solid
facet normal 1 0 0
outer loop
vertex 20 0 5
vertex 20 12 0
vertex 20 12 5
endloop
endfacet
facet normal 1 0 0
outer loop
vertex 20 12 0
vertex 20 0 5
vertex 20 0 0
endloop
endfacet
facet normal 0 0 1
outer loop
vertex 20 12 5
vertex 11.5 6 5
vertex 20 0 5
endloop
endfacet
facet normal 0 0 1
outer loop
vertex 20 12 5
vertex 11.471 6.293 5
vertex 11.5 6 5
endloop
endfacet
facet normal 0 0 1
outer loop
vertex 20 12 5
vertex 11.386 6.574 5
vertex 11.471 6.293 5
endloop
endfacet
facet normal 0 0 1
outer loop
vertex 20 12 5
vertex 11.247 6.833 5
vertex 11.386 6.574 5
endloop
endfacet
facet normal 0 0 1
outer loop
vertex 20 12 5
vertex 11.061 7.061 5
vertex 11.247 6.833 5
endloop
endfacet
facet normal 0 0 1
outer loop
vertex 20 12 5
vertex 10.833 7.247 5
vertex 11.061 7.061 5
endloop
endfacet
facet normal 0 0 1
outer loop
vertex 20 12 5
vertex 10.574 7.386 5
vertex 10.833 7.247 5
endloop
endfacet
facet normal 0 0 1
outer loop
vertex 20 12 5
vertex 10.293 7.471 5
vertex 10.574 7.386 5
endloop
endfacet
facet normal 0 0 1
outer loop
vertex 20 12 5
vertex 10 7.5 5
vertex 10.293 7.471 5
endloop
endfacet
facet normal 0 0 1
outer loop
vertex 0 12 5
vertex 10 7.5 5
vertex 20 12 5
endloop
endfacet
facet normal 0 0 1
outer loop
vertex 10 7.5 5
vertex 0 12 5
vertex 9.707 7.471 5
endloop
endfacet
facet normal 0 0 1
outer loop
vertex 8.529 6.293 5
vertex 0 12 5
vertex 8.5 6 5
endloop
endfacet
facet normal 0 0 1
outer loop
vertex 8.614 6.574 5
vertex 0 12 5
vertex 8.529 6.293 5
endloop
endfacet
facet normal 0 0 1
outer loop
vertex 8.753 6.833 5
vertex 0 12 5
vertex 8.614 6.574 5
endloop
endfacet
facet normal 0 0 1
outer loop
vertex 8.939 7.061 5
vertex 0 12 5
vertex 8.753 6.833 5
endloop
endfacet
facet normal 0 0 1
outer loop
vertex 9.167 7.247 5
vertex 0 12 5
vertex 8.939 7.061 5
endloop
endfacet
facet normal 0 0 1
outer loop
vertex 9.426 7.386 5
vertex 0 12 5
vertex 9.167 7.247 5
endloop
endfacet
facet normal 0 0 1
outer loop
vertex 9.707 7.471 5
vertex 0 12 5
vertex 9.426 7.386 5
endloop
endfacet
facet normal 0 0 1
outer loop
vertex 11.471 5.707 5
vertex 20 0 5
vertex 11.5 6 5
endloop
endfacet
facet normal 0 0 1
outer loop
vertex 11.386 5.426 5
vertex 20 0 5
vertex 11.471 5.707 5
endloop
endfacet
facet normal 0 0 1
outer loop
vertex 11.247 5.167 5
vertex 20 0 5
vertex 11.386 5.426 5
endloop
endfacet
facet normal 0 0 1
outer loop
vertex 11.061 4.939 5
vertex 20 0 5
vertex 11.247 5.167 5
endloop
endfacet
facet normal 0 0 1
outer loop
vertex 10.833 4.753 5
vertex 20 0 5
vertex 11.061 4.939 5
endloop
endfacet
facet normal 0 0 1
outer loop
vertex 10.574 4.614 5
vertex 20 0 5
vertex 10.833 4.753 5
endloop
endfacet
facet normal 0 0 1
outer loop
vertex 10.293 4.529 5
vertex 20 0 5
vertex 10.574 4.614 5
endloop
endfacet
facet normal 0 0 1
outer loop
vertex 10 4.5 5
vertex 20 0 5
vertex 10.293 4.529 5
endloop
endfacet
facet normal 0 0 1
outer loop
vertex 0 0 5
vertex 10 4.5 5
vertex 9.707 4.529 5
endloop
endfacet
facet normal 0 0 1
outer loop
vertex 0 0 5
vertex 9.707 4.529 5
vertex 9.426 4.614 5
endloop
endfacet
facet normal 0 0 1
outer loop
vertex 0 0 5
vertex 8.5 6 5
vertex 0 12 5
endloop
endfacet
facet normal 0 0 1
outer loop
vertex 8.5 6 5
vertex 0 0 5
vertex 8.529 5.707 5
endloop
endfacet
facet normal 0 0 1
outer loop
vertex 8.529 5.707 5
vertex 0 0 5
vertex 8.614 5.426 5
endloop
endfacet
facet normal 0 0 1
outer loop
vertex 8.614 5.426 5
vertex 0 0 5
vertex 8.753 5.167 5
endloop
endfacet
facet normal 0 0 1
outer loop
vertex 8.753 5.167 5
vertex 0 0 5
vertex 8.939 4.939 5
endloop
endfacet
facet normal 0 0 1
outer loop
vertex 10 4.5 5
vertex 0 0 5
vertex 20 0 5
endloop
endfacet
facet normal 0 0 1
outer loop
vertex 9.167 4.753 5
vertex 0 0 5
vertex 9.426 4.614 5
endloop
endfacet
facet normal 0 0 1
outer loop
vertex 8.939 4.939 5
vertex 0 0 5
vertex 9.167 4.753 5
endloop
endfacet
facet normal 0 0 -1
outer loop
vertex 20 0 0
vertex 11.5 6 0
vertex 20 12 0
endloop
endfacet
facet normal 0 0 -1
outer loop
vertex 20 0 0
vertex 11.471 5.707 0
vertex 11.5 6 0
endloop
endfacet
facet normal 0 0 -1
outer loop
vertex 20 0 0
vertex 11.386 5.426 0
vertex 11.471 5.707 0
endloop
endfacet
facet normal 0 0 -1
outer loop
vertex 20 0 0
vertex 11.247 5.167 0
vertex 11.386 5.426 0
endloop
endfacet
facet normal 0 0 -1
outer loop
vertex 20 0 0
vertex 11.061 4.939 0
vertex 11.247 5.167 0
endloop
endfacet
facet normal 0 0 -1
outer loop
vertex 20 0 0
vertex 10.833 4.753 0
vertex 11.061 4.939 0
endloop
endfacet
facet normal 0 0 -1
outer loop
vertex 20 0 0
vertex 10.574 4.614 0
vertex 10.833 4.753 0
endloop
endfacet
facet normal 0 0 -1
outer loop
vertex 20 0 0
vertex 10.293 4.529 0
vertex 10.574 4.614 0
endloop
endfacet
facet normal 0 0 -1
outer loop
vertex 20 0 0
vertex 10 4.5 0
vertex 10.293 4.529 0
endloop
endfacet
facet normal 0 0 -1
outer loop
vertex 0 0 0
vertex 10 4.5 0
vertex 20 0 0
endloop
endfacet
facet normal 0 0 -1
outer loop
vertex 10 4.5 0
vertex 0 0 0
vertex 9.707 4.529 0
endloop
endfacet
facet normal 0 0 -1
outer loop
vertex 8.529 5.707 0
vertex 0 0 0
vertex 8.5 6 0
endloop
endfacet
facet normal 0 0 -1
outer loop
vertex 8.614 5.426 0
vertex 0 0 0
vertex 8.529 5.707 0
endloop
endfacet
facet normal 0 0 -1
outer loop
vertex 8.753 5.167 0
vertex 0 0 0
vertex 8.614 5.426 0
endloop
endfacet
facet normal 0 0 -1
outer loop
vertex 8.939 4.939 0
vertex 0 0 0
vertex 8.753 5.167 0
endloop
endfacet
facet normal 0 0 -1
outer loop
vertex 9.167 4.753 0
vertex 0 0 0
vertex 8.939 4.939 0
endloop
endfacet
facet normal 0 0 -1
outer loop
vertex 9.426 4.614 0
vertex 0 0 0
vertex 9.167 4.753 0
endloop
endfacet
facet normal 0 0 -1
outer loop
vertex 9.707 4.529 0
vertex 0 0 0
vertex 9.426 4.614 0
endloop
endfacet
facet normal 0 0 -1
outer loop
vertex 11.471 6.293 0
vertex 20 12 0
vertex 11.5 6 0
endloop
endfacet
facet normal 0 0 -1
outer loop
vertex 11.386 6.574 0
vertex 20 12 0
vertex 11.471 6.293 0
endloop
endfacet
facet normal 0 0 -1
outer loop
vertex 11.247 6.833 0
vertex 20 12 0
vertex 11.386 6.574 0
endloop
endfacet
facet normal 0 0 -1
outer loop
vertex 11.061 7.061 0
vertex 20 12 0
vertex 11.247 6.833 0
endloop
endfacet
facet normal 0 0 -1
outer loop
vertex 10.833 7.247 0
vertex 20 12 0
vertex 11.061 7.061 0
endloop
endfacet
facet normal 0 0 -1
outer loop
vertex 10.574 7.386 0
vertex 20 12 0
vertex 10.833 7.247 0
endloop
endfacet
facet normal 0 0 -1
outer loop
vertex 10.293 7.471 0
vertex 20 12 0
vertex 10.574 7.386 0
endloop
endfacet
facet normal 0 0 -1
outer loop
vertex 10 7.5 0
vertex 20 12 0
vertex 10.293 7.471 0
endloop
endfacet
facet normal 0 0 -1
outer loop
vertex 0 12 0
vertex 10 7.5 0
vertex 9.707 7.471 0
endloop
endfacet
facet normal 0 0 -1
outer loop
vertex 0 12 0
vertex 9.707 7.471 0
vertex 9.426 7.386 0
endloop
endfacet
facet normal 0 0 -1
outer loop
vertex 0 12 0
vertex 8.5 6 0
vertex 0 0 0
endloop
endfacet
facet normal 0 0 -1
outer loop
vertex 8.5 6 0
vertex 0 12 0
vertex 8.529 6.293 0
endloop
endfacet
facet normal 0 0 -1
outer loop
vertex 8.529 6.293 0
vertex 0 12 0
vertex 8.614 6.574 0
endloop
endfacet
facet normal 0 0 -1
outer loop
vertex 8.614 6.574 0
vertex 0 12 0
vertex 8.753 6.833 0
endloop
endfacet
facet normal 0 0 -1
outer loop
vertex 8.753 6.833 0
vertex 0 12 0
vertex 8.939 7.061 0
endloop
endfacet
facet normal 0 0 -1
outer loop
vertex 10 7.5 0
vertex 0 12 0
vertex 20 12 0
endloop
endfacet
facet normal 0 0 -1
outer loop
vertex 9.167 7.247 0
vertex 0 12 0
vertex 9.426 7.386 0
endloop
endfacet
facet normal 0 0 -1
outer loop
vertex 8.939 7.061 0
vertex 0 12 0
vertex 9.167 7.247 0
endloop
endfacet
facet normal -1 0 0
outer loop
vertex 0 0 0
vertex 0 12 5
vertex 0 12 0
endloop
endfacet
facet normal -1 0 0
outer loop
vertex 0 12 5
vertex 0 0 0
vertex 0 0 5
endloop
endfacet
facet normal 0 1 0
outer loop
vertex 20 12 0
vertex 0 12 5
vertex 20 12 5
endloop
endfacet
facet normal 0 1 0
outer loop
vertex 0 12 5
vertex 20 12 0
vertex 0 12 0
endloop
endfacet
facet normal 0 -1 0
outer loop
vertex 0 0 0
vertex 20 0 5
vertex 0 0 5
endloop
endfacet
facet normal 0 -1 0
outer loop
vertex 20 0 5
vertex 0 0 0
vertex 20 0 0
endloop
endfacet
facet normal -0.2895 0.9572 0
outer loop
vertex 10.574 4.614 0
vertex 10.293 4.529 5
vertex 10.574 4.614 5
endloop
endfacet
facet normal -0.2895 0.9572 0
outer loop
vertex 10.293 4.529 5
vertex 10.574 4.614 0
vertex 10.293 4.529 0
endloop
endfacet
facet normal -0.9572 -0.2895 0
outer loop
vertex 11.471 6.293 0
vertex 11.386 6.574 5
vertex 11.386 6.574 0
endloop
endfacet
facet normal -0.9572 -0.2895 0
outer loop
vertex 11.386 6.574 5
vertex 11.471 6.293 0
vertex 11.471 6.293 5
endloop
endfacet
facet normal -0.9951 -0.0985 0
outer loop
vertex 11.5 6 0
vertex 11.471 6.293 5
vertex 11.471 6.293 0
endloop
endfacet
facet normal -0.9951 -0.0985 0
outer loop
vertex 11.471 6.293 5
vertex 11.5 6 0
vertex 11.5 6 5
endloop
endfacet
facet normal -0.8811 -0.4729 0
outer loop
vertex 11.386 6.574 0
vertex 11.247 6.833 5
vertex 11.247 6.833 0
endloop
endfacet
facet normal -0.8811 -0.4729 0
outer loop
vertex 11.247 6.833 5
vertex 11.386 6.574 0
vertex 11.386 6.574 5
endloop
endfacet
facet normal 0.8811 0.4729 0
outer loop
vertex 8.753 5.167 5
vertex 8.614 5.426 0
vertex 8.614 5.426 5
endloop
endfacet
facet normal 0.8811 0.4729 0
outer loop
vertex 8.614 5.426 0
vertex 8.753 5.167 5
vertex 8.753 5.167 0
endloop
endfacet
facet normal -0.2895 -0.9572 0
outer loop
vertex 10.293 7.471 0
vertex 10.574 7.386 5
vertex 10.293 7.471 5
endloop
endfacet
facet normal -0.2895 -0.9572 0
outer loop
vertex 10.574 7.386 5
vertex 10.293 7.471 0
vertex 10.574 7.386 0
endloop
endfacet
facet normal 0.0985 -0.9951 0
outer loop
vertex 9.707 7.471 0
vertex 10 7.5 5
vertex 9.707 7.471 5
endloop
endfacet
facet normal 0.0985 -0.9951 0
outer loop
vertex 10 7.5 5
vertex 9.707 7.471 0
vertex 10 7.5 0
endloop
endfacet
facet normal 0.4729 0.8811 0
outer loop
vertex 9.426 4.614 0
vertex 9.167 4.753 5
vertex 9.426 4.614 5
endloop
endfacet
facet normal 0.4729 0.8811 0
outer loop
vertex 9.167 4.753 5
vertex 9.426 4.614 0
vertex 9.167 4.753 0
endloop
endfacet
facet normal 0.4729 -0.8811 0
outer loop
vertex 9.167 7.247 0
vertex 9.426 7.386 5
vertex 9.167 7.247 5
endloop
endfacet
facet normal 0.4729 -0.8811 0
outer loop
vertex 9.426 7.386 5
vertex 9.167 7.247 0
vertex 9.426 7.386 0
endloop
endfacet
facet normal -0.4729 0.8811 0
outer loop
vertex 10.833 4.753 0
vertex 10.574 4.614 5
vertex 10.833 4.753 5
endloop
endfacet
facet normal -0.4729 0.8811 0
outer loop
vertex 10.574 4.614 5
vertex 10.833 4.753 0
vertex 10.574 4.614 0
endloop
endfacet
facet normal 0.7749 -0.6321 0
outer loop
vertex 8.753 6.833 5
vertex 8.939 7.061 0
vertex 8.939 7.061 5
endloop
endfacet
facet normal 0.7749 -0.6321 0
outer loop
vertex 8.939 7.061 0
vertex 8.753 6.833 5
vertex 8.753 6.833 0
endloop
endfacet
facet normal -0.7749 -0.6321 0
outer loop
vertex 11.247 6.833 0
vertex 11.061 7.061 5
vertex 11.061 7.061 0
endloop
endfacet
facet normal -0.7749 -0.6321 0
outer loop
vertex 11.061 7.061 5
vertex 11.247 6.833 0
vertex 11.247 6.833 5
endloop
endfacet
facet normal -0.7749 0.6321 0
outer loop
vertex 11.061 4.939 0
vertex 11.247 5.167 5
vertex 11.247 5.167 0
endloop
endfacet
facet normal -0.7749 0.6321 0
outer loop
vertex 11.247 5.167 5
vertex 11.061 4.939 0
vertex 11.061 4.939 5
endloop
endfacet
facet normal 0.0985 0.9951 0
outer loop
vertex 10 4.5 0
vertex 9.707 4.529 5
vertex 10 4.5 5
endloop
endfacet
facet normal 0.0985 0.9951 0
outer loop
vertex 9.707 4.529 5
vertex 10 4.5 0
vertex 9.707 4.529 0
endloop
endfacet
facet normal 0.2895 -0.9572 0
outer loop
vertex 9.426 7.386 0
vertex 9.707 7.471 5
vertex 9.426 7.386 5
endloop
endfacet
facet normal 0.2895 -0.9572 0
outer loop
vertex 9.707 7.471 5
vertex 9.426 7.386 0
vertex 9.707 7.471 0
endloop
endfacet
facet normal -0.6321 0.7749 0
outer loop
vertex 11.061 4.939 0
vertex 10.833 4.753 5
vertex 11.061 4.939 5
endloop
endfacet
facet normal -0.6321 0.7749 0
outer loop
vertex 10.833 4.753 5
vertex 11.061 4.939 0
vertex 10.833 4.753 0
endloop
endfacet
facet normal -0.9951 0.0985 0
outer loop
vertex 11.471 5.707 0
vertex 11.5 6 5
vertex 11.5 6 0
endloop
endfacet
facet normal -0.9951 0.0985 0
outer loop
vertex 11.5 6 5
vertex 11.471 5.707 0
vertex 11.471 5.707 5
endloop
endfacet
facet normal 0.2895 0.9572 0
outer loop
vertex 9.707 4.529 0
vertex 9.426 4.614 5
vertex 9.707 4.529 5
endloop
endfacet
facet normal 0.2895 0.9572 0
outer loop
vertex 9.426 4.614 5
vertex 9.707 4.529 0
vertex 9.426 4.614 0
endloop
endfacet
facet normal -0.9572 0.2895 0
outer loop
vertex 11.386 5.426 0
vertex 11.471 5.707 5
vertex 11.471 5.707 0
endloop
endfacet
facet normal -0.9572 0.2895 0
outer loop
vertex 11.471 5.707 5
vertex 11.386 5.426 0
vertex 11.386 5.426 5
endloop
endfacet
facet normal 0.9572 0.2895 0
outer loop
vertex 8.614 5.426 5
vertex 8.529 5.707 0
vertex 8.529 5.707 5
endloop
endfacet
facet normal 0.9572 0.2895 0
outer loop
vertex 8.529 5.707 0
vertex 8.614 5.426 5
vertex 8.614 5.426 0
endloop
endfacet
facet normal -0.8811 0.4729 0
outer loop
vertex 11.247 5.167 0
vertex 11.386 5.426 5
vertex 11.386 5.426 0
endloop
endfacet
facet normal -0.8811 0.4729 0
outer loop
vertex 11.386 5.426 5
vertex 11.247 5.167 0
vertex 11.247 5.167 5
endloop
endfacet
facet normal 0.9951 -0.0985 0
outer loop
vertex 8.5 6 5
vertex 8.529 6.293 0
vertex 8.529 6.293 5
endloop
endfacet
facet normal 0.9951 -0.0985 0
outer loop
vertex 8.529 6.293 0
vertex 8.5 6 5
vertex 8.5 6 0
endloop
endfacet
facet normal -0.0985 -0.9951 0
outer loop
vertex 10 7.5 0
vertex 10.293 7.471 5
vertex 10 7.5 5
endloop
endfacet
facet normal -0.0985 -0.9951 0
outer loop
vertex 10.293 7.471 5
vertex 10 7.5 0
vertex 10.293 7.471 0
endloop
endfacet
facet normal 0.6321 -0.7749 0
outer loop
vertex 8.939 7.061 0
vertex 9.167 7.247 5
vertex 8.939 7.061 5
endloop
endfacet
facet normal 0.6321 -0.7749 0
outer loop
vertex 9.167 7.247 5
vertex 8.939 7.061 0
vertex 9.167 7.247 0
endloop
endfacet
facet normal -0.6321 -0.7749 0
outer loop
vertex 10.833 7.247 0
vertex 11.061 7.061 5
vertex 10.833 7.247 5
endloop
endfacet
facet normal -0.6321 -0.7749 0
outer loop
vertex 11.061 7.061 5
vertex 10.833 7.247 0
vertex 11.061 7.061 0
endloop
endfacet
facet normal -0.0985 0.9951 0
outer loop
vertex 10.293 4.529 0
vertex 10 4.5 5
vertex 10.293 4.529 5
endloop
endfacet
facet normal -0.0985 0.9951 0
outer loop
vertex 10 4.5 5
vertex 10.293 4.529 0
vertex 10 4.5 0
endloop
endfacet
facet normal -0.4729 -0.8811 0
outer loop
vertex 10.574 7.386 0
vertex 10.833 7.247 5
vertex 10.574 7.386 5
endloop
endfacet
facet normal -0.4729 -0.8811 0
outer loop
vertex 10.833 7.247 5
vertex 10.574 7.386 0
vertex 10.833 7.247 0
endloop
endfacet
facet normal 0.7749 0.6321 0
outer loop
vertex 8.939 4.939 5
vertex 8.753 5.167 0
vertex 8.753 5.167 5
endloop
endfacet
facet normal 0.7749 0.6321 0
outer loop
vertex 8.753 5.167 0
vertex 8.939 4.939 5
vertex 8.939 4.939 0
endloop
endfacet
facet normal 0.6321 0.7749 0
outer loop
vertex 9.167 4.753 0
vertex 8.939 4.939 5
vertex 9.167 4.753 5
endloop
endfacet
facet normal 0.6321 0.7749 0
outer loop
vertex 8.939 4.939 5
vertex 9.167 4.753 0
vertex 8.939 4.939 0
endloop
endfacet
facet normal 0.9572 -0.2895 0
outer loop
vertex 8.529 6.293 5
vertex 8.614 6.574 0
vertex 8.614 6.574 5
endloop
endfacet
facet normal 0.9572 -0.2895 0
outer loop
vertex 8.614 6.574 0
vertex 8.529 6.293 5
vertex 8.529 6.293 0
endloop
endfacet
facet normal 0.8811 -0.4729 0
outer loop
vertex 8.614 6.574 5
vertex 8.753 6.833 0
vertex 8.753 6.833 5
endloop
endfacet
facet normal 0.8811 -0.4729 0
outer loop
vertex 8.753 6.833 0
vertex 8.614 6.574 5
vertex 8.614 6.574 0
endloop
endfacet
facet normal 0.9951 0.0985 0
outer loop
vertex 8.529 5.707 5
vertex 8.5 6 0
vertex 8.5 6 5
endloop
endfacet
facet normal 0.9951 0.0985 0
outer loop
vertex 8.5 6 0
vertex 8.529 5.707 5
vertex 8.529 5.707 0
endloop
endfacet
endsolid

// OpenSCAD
$fn = 32;

// ----------------------------------------------------------------------
// Micro pad: drilled pad, 5-20 mm class
// ----------------------------------------------------------------------

// --- parameters (mm) ---
pad_l = 20;               // pad length, X
pad_w = 12;               // pad width, Y
pad_t = 5;                // pad thickness, Z
hole_d = 3;               // through hole diameter

difference() {
  cube([pad_l, pad_w, pad_t]);
  translate([pad_l / 2, pad_w / 2, -1])
    cylinder(h = pad_t + 2, d = hole_d);
}
